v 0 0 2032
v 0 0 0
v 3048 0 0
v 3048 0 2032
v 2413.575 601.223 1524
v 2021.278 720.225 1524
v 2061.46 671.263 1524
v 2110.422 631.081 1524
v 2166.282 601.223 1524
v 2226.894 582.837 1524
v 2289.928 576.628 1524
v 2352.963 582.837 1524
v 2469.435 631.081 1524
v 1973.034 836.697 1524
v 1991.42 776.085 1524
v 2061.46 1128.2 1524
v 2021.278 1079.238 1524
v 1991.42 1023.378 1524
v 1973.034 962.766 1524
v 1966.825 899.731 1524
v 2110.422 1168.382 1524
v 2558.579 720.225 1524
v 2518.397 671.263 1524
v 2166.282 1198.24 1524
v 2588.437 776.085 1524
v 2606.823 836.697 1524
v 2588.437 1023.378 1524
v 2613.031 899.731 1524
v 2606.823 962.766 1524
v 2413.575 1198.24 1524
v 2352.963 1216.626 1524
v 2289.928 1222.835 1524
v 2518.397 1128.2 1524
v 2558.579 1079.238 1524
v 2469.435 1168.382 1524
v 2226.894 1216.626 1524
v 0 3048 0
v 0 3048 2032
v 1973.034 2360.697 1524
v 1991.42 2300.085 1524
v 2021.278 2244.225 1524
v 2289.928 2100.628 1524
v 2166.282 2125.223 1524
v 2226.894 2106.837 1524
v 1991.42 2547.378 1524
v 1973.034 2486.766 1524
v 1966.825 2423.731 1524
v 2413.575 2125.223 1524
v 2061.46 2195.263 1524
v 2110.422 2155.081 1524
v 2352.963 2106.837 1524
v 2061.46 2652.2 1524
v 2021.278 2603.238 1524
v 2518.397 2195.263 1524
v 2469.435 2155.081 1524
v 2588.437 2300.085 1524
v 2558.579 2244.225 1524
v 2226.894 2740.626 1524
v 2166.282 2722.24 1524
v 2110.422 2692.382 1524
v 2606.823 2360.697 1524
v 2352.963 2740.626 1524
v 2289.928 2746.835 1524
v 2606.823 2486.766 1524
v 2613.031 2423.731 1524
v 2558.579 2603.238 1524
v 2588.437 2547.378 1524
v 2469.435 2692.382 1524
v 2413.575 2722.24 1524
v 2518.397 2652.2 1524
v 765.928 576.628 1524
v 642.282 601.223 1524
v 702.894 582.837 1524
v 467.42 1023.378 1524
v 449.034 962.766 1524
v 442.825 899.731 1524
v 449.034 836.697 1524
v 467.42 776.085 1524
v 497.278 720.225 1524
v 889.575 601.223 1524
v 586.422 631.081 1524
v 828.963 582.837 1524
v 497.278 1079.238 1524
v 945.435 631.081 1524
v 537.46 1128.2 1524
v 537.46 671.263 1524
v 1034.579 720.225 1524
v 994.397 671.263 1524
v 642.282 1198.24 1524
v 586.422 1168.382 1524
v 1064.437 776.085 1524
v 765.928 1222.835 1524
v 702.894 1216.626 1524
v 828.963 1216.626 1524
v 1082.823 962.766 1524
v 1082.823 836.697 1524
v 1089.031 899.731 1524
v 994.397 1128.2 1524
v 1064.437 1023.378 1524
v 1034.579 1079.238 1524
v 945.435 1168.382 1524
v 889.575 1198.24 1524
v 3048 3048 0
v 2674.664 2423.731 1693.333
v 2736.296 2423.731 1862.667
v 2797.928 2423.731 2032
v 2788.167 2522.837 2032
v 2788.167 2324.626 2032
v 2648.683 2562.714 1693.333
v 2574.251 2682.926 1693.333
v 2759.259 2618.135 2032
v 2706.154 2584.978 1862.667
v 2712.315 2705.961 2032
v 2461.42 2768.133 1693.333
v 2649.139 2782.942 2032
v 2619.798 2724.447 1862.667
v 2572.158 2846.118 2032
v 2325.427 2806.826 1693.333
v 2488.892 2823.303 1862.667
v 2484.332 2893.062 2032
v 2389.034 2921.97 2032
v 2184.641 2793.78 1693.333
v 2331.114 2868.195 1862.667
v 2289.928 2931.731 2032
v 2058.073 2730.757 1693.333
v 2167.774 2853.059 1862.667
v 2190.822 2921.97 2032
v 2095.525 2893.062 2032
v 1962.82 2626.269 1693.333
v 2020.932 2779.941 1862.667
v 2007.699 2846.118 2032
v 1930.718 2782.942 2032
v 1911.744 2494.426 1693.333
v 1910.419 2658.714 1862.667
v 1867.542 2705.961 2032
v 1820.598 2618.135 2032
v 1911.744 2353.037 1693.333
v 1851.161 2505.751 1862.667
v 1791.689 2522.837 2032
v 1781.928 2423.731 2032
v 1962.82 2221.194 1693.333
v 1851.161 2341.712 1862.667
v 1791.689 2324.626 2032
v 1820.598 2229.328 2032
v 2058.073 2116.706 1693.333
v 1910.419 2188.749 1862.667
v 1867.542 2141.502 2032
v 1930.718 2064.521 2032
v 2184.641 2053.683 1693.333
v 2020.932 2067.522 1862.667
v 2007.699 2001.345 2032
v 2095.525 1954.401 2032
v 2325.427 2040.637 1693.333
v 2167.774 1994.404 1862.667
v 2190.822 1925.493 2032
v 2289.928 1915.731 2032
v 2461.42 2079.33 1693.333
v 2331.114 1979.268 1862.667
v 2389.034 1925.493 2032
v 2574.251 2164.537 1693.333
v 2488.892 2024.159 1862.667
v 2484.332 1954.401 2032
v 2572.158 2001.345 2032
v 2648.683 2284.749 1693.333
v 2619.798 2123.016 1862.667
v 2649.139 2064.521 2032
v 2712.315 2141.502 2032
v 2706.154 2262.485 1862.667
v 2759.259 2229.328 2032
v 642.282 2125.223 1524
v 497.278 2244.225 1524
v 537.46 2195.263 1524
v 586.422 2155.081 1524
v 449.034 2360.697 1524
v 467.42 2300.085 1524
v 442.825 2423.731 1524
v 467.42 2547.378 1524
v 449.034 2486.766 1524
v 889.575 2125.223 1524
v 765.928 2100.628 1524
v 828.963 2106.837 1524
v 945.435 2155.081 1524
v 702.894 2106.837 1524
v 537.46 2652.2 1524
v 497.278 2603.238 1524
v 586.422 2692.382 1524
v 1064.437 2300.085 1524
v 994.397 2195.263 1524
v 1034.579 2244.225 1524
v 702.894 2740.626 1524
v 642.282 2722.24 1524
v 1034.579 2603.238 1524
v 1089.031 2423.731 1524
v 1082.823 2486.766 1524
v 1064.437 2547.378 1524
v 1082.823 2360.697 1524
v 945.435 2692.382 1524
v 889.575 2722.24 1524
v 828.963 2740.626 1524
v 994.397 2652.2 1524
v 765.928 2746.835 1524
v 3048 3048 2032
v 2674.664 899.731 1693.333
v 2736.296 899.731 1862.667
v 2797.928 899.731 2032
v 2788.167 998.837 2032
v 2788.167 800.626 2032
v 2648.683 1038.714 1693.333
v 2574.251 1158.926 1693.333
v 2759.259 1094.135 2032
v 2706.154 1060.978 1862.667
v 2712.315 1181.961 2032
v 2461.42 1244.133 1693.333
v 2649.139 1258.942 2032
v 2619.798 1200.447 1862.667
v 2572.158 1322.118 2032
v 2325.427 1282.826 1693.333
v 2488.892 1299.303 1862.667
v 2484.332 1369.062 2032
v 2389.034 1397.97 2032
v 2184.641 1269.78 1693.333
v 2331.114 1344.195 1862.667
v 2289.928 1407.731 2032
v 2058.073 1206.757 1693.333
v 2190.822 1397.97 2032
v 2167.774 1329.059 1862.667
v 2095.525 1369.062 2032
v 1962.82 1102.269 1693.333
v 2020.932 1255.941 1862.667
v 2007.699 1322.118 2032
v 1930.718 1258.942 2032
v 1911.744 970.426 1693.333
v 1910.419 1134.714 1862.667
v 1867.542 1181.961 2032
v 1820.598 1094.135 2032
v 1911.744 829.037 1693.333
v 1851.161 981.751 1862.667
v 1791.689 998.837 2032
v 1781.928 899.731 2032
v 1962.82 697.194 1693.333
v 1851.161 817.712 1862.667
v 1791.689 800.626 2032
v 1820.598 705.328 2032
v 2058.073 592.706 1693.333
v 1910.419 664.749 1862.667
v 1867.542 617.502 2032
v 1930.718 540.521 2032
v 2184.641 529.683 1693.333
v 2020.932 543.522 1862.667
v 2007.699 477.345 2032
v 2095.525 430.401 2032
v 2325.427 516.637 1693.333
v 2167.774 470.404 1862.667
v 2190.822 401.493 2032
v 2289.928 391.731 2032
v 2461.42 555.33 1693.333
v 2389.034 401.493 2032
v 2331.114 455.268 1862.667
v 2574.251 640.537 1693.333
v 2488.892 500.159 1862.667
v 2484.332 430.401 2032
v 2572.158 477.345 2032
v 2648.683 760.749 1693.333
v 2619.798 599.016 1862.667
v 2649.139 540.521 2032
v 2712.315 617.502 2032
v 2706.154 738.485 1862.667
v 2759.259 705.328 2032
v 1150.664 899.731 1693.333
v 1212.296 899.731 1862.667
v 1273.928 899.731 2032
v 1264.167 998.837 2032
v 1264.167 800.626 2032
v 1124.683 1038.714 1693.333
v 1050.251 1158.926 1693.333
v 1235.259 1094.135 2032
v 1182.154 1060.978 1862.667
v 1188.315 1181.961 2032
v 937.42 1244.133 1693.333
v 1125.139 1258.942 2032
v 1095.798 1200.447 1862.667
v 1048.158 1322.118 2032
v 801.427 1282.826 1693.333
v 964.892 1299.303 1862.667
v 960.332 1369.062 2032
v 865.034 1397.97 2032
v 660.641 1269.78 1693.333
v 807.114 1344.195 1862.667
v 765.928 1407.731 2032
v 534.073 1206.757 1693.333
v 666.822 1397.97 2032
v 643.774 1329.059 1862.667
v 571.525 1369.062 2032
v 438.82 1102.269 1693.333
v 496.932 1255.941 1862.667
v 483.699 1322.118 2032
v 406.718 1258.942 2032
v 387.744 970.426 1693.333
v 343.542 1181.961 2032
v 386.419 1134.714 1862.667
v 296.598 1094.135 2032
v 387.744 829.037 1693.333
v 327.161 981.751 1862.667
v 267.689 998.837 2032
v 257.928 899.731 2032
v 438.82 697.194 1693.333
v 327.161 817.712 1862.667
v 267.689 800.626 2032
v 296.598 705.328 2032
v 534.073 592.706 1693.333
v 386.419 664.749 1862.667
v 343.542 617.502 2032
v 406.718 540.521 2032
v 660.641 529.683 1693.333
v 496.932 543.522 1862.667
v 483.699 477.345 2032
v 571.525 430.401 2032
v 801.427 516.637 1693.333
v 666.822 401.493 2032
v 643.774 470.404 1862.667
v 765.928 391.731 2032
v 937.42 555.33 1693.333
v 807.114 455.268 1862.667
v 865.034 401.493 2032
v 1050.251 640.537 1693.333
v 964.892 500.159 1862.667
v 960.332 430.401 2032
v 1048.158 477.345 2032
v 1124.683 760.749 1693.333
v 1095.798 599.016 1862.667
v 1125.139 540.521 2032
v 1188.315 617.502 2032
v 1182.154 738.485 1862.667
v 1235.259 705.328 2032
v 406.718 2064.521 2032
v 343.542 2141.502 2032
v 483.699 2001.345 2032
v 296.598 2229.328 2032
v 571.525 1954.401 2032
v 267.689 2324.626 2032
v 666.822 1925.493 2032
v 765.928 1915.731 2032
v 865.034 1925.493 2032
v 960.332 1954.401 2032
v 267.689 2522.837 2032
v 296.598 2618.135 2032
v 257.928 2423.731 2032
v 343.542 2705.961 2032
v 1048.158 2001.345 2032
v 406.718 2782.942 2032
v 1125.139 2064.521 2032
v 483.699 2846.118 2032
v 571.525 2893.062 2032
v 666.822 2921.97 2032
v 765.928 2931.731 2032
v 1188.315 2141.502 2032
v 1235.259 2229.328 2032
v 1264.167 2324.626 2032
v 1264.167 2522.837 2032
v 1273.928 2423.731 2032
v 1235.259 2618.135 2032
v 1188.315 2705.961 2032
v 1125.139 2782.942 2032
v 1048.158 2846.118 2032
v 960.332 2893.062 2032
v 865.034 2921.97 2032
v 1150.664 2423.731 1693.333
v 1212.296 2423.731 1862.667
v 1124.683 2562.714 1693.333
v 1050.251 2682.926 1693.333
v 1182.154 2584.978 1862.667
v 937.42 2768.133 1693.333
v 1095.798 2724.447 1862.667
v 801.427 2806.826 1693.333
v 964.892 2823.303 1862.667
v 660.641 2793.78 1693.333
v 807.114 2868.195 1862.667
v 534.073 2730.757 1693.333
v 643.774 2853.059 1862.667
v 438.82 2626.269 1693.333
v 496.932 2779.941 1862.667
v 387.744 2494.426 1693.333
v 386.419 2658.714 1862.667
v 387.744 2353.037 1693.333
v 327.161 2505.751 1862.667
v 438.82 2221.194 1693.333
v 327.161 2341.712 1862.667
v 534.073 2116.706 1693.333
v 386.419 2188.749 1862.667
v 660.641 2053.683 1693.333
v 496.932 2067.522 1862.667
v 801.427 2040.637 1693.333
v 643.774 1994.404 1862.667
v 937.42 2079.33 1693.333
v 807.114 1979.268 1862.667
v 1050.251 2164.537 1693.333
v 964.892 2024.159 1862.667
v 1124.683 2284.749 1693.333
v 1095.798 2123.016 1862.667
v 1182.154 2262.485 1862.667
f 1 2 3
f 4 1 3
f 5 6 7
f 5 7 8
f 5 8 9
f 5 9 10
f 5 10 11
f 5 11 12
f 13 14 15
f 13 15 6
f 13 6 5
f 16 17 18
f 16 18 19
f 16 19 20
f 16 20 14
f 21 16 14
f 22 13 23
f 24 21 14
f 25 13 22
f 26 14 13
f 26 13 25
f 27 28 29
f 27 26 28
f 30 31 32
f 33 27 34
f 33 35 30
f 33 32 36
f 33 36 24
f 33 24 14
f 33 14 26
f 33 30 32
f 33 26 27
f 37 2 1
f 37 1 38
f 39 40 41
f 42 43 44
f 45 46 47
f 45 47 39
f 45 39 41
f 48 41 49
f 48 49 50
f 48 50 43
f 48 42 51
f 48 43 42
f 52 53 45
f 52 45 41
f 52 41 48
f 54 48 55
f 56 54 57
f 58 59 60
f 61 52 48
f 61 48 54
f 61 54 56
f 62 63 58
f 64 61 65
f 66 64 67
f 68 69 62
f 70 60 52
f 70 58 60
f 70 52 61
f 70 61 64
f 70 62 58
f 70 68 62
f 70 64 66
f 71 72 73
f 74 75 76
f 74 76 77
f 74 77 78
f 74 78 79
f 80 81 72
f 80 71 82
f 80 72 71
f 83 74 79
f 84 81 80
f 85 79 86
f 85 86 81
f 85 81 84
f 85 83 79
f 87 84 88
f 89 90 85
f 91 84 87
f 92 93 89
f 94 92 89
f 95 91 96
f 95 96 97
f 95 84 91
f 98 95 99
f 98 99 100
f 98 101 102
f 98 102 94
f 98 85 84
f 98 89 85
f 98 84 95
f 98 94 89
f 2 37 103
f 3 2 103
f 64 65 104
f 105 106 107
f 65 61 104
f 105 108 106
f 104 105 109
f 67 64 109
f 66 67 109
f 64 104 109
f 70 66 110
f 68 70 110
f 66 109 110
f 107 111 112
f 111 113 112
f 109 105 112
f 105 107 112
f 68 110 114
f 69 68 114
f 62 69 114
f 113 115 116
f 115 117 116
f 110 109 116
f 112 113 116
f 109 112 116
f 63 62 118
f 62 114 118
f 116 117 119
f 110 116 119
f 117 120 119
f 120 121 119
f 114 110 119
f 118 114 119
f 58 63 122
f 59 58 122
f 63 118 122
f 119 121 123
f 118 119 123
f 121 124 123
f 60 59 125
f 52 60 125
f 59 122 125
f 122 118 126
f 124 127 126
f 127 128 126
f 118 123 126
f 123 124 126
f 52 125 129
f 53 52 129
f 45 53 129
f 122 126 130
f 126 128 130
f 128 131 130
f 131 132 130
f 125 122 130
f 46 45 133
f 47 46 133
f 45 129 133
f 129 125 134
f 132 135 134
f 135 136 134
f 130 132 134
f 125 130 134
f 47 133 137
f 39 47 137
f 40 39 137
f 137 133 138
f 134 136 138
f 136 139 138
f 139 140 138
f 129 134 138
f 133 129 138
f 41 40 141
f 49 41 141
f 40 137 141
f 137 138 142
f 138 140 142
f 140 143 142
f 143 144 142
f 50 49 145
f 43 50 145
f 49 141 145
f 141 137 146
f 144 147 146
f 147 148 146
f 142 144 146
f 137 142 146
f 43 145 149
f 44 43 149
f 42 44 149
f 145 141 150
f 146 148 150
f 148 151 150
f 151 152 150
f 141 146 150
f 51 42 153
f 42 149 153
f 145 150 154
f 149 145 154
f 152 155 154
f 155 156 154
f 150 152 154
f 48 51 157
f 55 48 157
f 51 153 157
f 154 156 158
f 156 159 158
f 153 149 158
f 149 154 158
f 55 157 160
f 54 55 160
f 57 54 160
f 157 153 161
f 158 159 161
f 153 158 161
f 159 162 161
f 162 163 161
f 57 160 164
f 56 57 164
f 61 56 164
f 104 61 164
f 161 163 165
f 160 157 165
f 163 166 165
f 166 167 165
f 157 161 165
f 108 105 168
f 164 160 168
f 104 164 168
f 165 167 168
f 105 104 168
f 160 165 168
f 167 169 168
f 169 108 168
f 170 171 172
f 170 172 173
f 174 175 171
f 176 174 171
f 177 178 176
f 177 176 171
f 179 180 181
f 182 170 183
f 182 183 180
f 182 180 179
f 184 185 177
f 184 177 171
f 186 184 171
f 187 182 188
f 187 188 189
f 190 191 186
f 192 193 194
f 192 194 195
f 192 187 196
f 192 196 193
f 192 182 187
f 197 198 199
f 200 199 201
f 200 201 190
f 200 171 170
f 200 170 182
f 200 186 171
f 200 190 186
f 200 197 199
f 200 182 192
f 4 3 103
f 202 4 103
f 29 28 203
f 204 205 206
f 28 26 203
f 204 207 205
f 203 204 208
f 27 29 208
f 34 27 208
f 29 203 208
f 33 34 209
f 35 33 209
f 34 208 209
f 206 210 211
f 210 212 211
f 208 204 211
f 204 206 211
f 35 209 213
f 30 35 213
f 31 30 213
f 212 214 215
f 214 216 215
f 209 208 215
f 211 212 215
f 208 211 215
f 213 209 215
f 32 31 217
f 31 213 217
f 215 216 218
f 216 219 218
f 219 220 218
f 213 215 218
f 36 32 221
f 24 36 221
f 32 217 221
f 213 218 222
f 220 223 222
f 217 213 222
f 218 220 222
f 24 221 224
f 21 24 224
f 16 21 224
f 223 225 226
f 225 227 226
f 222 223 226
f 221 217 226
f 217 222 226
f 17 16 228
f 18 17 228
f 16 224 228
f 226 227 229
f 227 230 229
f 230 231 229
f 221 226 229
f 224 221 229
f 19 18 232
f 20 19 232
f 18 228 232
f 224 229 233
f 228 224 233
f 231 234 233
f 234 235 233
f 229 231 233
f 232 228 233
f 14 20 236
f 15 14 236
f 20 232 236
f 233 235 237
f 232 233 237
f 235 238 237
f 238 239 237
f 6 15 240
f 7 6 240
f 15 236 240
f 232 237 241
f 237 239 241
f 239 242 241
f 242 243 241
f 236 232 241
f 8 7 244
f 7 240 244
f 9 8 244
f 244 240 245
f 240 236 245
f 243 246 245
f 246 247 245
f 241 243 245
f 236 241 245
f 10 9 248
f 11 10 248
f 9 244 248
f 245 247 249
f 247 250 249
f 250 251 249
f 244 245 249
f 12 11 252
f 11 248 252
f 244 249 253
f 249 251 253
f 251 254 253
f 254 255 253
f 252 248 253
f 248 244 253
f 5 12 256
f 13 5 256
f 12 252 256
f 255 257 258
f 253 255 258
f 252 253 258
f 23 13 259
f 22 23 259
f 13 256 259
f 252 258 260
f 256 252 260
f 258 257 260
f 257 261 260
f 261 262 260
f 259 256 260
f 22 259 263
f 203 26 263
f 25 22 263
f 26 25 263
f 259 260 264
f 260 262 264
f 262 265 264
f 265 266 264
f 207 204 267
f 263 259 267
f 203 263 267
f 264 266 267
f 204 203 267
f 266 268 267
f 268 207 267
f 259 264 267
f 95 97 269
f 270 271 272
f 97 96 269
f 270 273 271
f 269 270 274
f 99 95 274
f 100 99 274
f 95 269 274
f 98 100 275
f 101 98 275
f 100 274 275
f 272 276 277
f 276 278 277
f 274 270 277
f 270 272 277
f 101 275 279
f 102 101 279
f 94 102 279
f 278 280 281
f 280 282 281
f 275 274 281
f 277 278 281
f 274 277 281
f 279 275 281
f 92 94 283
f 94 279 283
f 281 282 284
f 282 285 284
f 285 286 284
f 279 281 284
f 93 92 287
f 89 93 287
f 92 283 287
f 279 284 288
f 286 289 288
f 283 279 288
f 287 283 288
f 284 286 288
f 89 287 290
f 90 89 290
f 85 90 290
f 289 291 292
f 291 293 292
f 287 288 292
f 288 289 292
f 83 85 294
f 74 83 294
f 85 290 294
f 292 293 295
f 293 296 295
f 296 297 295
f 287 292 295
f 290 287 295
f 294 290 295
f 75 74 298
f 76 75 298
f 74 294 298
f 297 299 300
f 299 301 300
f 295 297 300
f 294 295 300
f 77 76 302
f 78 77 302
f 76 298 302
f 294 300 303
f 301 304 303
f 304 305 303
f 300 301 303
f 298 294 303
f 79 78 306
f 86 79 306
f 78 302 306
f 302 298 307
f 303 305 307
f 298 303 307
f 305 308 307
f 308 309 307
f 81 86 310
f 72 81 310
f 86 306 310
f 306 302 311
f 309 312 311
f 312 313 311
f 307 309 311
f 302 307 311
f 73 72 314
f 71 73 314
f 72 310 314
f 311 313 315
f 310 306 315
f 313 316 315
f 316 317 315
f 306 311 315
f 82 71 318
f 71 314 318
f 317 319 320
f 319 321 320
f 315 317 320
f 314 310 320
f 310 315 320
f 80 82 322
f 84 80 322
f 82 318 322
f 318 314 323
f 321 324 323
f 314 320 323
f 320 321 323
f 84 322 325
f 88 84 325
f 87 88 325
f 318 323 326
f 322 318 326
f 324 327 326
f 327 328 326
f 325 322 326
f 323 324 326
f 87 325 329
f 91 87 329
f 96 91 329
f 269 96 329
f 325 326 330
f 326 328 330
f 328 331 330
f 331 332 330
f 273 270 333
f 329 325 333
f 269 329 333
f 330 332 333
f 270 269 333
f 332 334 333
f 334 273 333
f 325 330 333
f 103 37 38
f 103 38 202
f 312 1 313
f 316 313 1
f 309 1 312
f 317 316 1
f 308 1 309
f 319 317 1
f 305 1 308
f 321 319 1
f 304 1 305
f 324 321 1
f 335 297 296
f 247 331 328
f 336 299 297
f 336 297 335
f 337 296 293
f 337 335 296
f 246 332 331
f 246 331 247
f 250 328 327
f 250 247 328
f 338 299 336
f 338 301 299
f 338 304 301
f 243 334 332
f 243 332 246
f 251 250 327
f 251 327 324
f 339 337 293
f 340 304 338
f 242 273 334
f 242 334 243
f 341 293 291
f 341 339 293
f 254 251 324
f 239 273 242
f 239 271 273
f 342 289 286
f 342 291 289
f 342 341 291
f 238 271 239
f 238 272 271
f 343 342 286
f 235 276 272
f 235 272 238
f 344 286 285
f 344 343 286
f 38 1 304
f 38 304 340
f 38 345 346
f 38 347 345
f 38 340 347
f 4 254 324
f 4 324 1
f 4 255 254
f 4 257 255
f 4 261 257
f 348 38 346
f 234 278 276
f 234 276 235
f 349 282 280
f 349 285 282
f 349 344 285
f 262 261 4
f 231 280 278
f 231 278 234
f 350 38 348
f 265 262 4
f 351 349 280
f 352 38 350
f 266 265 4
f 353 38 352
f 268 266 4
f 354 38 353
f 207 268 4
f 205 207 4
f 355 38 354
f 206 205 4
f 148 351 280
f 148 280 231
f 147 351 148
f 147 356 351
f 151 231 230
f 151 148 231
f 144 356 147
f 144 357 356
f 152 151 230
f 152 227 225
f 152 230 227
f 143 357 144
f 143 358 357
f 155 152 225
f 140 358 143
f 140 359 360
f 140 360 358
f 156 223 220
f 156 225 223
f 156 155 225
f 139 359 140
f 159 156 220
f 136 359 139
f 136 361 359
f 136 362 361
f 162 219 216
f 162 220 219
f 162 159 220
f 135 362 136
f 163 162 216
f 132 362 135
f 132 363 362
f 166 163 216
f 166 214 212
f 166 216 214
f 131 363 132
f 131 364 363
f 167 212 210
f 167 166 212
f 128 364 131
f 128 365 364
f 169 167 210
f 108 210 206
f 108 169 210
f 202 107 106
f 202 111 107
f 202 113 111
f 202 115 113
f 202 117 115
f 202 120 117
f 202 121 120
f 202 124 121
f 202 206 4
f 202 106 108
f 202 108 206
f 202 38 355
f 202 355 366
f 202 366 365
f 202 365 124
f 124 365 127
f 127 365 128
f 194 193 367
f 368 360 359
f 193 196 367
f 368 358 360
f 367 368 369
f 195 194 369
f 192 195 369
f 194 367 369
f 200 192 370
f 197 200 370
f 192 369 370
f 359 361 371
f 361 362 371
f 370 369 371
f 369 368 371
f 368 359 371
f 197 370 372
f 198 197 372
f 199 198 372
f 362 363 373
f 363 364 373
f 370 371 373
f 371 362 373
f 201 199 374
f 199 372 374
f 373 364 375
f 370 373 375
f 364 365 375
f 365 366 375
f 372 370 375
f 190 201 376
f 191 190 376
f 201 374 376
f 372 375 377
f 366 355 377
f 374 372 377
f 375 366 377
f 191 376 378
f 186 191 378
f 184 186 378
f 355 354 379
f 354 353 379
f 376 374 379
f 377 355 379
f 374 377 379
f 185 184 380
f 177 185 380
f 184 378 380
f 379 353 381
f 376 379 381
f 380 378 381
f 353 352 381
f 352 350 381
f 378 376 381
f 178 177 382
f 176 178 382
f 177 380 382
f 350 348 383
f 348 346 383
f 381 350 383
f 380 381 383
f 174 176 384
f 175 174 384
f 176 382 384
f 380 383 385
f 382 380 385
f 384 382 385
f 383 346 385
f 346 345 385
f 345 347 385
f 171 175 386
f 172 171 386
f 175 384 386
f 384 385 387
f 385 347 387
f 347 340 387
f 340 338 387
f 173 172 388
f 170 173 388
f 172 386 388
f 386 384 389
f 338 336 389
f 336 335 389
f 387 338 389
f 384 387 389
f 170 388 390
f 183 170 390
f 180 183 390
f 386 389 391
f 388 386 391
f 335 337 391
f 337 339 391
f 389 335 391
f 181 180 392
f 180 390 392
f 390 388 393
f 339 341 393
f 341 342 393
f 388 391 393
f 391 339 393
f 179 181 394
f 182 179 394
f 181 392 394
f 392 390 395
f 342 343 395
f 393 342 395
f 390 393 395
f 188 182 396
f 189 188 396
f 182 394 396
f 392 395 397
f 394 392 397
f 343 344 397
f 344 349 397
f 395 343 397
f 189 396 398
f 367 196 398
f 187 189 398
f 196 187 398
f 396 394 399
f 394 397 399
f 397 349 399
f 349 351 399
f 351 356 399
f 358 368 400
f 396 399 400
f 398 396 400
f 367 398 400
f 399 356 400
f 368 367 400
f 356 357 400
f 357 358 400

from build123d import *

# Parameters (mm, degrees)
SKETCH1_W                 = 3048
SKETCH1_H                 = 3048
BOSS_EXTRUDE1_DEPTH       = 2032
CUT_EXTRUDE1_START        = 2032
SKETCH2_R                 = 508
CUT_EXTRUDE1_DEPTH        = 508
CUT_EXTRUDE1_DRAFT        = -20
LPATTERN1_START           = 2032
LPATTERN1_COPY_1_SKETCH_R = 508
LPATTERN1_COPY_1_DEPTH    = 508
LPATTERN1_COPY_1_DRAFT    = -20
LPATTERN1_COPY_2_SKETCH_R = 508
LPATTERN1_COPY_2_DEPTH    = 508
LPATTERN1_COPY_2_DRAFT    = -20
LPATTERN1_COPY_3_SKETCH_R = 508
LPATTERN1_COPY_3_DEPTH    = 508
LPATTERN1_COPY_3_DRAFT    = -20


with BuildPart() as part:
    # Sketch1 → Boss-Extrude1 (new body)
    with BuildSketch(Plane.XY):
        with Locations((1524, 1524)):
            Rectangle(SKETCH1_W, SKETCH1_H)
    extrude(amount=BOSS_EXTRUDE1_DEPTH)


with BuildPart() as cut_extrude1_tool:
    # Sketch2 → Cut-Extrude1 (with draft: the straight prism first)
    with BuildSketch(Plane.XY.offset(CUT_EXTRUDE1_START)):
        with Locations((765.92836786, 2423.73148259)):
            Circle(SKETCH2_R)
    extrude(amount=-CUT_EXTRUDE1_DEPTH)
    # Cut-Extrude1: the draft: its side faces are tilted about the plane it starts from
    cut_extrude1_sides = [cut_extrude1_tool.faces().sort_by_distance(p)[0] for p in [
        (257.92836786, 2423.73148259, 1778),
    ]]
    draft(cut_extrude1_sides, Plane.XY.offset(CUT_EXTRUDE1_START), CUT_EXTRUDE1_DRAFT)


with BuildPart() as part_1:
    add(part.part)

    # Cut-Extrude1: cut by cut_extrude1_tool
    add(cut_extrude1_tool.part, mode=Mode.SUBTRACT)


with BuildPart() as lpattern1_copy_1_tool:
    # LPattern1 copy 1 sketch → LPattern1 copy 1 (with draft: the straight prism first)
    with BuildSketch(Plane(origin=(0, -1524, 0), x_dir=(1, 0, 0), z_dir=(0, 0, 1)).offset(LPATTERN1_START)):
        with Locations((765.92836786, 2423.73148259)):
            Circle(LPATTERN1_COPY_1_SKETCH_R)
    extrude(amount=-LPATTERN1_COPY_1_DEPTH)
    # LPattern1 copy 1: the draft: its side faces are tilted about the plane it starts from
    lpattern1_copy_1_sides = [lpattern1_copy_1_tool.faces().sort_by_distance(p)[0] for p in [
        (257.92836786, 899.73148259, 1778),
    ]]
    draft(lpattern1_copy_1_sides, Plane(origin=(0, -1524, 0), x_dir=(1, 0, 0), z_dir=(0, 0, 1)).offset(LPATTERN1_START), LPATTERN1_COPY_1_DRAFT)


with BuildPart() as part_2:
    add(part_1.part)

    # LPattern1 copy 1: cut by lpattern1_copy_1_tool
    add(lpattern1_copy_1_tool.part, mode=Mode.SUBTRACT)


with BuildPart() as lpattern1_copy_2_tool:
    # LPattern1 copy 2 sketch → LPattern1 copy 2 (with draft: the straight prism first)
    with BuildSketch(Plane(origin=(1524, 0, 0), x_dir=(1, 0, 0), z_dir=(0, 0, 1)).offset(LPATTERN1_START)):
        with Locations((765.92836786, 2423.73148259)):
            Circle(LPATTERN1_COPY_2_SKETCH_R)
    extrude(amount=-LPATTERN1_COPY_2_DEPTH)
    # LPattern1 copy 2: the draft: its side faces are tilted about the plane it starts from
    lpattern1_copy_2_sides = [lpattern1_copy_2_tool.faces().sort_by_distance(p)[0] for p in [
        (1781.92836786, 2423.73148259, 1778),
    ]]
    draft(lpattern1_copy_2_sides, Plane(origin=(1524, 0, 0), x_dir=(1, 0, 0), z_dir=(0, 0, 1)).offset(LPATTERN1_START), LPATTERN1_COPY_2_DRAFT)


with BuildPart() as part_3:
    add(part_2.part)

    # LPattern1 copy 2: cut by lpattern1_copy_2_tool
    add(lpattern1_copy_2_tool.part, mode=Mode.SUBTRACT)


with BuildPart() as lpattern1_copy_3_tool:
    # LPattern1 copy 3 sketch → LPattern1 copy 3 (with draft: the straight prism first)
    with BuildSketch(Plane(origin=(1524, -1524, 0), x_dir=(1, 0, 0), z_dir=(0, 0, 1)).offset(LPATTERN1_START)):
        with Locations((765.92836786, 2423.73148259)):
            Circle(LPATTERN1_COPY_3_SKETCH_R)
    extrude(amount=-LPATTERN1_COPY_3_DEPTH)
    # LPattern1 copy 3: the draft: its side faces are tilted about the plane it starts from
    lpattern1_copy_3_sides = [lpattern1_copy_3_tool.faces().sort_by_distance(p)[0] for p in [
        (1781.92836786, 899.73148259, 1778),
    ]]
    draft(lpattern1_copy_3_sides, Plane(origin=(1524, -1524, 0), x_dir=(1, 0, 0), z_dir=(0, 0, 1)).offset(LPATTERN1_START), LPATTERN1_COPY_3_DRAFT)


with BuildPart() as part_4:
    add(part_3.part)

    # LPattern1 copy 3: cut by lpattern1_copy_3_tool
    add(lpattern1_copy_3_tool.part, mode=Mode.SUBTRACT)


solid = part_4.part
